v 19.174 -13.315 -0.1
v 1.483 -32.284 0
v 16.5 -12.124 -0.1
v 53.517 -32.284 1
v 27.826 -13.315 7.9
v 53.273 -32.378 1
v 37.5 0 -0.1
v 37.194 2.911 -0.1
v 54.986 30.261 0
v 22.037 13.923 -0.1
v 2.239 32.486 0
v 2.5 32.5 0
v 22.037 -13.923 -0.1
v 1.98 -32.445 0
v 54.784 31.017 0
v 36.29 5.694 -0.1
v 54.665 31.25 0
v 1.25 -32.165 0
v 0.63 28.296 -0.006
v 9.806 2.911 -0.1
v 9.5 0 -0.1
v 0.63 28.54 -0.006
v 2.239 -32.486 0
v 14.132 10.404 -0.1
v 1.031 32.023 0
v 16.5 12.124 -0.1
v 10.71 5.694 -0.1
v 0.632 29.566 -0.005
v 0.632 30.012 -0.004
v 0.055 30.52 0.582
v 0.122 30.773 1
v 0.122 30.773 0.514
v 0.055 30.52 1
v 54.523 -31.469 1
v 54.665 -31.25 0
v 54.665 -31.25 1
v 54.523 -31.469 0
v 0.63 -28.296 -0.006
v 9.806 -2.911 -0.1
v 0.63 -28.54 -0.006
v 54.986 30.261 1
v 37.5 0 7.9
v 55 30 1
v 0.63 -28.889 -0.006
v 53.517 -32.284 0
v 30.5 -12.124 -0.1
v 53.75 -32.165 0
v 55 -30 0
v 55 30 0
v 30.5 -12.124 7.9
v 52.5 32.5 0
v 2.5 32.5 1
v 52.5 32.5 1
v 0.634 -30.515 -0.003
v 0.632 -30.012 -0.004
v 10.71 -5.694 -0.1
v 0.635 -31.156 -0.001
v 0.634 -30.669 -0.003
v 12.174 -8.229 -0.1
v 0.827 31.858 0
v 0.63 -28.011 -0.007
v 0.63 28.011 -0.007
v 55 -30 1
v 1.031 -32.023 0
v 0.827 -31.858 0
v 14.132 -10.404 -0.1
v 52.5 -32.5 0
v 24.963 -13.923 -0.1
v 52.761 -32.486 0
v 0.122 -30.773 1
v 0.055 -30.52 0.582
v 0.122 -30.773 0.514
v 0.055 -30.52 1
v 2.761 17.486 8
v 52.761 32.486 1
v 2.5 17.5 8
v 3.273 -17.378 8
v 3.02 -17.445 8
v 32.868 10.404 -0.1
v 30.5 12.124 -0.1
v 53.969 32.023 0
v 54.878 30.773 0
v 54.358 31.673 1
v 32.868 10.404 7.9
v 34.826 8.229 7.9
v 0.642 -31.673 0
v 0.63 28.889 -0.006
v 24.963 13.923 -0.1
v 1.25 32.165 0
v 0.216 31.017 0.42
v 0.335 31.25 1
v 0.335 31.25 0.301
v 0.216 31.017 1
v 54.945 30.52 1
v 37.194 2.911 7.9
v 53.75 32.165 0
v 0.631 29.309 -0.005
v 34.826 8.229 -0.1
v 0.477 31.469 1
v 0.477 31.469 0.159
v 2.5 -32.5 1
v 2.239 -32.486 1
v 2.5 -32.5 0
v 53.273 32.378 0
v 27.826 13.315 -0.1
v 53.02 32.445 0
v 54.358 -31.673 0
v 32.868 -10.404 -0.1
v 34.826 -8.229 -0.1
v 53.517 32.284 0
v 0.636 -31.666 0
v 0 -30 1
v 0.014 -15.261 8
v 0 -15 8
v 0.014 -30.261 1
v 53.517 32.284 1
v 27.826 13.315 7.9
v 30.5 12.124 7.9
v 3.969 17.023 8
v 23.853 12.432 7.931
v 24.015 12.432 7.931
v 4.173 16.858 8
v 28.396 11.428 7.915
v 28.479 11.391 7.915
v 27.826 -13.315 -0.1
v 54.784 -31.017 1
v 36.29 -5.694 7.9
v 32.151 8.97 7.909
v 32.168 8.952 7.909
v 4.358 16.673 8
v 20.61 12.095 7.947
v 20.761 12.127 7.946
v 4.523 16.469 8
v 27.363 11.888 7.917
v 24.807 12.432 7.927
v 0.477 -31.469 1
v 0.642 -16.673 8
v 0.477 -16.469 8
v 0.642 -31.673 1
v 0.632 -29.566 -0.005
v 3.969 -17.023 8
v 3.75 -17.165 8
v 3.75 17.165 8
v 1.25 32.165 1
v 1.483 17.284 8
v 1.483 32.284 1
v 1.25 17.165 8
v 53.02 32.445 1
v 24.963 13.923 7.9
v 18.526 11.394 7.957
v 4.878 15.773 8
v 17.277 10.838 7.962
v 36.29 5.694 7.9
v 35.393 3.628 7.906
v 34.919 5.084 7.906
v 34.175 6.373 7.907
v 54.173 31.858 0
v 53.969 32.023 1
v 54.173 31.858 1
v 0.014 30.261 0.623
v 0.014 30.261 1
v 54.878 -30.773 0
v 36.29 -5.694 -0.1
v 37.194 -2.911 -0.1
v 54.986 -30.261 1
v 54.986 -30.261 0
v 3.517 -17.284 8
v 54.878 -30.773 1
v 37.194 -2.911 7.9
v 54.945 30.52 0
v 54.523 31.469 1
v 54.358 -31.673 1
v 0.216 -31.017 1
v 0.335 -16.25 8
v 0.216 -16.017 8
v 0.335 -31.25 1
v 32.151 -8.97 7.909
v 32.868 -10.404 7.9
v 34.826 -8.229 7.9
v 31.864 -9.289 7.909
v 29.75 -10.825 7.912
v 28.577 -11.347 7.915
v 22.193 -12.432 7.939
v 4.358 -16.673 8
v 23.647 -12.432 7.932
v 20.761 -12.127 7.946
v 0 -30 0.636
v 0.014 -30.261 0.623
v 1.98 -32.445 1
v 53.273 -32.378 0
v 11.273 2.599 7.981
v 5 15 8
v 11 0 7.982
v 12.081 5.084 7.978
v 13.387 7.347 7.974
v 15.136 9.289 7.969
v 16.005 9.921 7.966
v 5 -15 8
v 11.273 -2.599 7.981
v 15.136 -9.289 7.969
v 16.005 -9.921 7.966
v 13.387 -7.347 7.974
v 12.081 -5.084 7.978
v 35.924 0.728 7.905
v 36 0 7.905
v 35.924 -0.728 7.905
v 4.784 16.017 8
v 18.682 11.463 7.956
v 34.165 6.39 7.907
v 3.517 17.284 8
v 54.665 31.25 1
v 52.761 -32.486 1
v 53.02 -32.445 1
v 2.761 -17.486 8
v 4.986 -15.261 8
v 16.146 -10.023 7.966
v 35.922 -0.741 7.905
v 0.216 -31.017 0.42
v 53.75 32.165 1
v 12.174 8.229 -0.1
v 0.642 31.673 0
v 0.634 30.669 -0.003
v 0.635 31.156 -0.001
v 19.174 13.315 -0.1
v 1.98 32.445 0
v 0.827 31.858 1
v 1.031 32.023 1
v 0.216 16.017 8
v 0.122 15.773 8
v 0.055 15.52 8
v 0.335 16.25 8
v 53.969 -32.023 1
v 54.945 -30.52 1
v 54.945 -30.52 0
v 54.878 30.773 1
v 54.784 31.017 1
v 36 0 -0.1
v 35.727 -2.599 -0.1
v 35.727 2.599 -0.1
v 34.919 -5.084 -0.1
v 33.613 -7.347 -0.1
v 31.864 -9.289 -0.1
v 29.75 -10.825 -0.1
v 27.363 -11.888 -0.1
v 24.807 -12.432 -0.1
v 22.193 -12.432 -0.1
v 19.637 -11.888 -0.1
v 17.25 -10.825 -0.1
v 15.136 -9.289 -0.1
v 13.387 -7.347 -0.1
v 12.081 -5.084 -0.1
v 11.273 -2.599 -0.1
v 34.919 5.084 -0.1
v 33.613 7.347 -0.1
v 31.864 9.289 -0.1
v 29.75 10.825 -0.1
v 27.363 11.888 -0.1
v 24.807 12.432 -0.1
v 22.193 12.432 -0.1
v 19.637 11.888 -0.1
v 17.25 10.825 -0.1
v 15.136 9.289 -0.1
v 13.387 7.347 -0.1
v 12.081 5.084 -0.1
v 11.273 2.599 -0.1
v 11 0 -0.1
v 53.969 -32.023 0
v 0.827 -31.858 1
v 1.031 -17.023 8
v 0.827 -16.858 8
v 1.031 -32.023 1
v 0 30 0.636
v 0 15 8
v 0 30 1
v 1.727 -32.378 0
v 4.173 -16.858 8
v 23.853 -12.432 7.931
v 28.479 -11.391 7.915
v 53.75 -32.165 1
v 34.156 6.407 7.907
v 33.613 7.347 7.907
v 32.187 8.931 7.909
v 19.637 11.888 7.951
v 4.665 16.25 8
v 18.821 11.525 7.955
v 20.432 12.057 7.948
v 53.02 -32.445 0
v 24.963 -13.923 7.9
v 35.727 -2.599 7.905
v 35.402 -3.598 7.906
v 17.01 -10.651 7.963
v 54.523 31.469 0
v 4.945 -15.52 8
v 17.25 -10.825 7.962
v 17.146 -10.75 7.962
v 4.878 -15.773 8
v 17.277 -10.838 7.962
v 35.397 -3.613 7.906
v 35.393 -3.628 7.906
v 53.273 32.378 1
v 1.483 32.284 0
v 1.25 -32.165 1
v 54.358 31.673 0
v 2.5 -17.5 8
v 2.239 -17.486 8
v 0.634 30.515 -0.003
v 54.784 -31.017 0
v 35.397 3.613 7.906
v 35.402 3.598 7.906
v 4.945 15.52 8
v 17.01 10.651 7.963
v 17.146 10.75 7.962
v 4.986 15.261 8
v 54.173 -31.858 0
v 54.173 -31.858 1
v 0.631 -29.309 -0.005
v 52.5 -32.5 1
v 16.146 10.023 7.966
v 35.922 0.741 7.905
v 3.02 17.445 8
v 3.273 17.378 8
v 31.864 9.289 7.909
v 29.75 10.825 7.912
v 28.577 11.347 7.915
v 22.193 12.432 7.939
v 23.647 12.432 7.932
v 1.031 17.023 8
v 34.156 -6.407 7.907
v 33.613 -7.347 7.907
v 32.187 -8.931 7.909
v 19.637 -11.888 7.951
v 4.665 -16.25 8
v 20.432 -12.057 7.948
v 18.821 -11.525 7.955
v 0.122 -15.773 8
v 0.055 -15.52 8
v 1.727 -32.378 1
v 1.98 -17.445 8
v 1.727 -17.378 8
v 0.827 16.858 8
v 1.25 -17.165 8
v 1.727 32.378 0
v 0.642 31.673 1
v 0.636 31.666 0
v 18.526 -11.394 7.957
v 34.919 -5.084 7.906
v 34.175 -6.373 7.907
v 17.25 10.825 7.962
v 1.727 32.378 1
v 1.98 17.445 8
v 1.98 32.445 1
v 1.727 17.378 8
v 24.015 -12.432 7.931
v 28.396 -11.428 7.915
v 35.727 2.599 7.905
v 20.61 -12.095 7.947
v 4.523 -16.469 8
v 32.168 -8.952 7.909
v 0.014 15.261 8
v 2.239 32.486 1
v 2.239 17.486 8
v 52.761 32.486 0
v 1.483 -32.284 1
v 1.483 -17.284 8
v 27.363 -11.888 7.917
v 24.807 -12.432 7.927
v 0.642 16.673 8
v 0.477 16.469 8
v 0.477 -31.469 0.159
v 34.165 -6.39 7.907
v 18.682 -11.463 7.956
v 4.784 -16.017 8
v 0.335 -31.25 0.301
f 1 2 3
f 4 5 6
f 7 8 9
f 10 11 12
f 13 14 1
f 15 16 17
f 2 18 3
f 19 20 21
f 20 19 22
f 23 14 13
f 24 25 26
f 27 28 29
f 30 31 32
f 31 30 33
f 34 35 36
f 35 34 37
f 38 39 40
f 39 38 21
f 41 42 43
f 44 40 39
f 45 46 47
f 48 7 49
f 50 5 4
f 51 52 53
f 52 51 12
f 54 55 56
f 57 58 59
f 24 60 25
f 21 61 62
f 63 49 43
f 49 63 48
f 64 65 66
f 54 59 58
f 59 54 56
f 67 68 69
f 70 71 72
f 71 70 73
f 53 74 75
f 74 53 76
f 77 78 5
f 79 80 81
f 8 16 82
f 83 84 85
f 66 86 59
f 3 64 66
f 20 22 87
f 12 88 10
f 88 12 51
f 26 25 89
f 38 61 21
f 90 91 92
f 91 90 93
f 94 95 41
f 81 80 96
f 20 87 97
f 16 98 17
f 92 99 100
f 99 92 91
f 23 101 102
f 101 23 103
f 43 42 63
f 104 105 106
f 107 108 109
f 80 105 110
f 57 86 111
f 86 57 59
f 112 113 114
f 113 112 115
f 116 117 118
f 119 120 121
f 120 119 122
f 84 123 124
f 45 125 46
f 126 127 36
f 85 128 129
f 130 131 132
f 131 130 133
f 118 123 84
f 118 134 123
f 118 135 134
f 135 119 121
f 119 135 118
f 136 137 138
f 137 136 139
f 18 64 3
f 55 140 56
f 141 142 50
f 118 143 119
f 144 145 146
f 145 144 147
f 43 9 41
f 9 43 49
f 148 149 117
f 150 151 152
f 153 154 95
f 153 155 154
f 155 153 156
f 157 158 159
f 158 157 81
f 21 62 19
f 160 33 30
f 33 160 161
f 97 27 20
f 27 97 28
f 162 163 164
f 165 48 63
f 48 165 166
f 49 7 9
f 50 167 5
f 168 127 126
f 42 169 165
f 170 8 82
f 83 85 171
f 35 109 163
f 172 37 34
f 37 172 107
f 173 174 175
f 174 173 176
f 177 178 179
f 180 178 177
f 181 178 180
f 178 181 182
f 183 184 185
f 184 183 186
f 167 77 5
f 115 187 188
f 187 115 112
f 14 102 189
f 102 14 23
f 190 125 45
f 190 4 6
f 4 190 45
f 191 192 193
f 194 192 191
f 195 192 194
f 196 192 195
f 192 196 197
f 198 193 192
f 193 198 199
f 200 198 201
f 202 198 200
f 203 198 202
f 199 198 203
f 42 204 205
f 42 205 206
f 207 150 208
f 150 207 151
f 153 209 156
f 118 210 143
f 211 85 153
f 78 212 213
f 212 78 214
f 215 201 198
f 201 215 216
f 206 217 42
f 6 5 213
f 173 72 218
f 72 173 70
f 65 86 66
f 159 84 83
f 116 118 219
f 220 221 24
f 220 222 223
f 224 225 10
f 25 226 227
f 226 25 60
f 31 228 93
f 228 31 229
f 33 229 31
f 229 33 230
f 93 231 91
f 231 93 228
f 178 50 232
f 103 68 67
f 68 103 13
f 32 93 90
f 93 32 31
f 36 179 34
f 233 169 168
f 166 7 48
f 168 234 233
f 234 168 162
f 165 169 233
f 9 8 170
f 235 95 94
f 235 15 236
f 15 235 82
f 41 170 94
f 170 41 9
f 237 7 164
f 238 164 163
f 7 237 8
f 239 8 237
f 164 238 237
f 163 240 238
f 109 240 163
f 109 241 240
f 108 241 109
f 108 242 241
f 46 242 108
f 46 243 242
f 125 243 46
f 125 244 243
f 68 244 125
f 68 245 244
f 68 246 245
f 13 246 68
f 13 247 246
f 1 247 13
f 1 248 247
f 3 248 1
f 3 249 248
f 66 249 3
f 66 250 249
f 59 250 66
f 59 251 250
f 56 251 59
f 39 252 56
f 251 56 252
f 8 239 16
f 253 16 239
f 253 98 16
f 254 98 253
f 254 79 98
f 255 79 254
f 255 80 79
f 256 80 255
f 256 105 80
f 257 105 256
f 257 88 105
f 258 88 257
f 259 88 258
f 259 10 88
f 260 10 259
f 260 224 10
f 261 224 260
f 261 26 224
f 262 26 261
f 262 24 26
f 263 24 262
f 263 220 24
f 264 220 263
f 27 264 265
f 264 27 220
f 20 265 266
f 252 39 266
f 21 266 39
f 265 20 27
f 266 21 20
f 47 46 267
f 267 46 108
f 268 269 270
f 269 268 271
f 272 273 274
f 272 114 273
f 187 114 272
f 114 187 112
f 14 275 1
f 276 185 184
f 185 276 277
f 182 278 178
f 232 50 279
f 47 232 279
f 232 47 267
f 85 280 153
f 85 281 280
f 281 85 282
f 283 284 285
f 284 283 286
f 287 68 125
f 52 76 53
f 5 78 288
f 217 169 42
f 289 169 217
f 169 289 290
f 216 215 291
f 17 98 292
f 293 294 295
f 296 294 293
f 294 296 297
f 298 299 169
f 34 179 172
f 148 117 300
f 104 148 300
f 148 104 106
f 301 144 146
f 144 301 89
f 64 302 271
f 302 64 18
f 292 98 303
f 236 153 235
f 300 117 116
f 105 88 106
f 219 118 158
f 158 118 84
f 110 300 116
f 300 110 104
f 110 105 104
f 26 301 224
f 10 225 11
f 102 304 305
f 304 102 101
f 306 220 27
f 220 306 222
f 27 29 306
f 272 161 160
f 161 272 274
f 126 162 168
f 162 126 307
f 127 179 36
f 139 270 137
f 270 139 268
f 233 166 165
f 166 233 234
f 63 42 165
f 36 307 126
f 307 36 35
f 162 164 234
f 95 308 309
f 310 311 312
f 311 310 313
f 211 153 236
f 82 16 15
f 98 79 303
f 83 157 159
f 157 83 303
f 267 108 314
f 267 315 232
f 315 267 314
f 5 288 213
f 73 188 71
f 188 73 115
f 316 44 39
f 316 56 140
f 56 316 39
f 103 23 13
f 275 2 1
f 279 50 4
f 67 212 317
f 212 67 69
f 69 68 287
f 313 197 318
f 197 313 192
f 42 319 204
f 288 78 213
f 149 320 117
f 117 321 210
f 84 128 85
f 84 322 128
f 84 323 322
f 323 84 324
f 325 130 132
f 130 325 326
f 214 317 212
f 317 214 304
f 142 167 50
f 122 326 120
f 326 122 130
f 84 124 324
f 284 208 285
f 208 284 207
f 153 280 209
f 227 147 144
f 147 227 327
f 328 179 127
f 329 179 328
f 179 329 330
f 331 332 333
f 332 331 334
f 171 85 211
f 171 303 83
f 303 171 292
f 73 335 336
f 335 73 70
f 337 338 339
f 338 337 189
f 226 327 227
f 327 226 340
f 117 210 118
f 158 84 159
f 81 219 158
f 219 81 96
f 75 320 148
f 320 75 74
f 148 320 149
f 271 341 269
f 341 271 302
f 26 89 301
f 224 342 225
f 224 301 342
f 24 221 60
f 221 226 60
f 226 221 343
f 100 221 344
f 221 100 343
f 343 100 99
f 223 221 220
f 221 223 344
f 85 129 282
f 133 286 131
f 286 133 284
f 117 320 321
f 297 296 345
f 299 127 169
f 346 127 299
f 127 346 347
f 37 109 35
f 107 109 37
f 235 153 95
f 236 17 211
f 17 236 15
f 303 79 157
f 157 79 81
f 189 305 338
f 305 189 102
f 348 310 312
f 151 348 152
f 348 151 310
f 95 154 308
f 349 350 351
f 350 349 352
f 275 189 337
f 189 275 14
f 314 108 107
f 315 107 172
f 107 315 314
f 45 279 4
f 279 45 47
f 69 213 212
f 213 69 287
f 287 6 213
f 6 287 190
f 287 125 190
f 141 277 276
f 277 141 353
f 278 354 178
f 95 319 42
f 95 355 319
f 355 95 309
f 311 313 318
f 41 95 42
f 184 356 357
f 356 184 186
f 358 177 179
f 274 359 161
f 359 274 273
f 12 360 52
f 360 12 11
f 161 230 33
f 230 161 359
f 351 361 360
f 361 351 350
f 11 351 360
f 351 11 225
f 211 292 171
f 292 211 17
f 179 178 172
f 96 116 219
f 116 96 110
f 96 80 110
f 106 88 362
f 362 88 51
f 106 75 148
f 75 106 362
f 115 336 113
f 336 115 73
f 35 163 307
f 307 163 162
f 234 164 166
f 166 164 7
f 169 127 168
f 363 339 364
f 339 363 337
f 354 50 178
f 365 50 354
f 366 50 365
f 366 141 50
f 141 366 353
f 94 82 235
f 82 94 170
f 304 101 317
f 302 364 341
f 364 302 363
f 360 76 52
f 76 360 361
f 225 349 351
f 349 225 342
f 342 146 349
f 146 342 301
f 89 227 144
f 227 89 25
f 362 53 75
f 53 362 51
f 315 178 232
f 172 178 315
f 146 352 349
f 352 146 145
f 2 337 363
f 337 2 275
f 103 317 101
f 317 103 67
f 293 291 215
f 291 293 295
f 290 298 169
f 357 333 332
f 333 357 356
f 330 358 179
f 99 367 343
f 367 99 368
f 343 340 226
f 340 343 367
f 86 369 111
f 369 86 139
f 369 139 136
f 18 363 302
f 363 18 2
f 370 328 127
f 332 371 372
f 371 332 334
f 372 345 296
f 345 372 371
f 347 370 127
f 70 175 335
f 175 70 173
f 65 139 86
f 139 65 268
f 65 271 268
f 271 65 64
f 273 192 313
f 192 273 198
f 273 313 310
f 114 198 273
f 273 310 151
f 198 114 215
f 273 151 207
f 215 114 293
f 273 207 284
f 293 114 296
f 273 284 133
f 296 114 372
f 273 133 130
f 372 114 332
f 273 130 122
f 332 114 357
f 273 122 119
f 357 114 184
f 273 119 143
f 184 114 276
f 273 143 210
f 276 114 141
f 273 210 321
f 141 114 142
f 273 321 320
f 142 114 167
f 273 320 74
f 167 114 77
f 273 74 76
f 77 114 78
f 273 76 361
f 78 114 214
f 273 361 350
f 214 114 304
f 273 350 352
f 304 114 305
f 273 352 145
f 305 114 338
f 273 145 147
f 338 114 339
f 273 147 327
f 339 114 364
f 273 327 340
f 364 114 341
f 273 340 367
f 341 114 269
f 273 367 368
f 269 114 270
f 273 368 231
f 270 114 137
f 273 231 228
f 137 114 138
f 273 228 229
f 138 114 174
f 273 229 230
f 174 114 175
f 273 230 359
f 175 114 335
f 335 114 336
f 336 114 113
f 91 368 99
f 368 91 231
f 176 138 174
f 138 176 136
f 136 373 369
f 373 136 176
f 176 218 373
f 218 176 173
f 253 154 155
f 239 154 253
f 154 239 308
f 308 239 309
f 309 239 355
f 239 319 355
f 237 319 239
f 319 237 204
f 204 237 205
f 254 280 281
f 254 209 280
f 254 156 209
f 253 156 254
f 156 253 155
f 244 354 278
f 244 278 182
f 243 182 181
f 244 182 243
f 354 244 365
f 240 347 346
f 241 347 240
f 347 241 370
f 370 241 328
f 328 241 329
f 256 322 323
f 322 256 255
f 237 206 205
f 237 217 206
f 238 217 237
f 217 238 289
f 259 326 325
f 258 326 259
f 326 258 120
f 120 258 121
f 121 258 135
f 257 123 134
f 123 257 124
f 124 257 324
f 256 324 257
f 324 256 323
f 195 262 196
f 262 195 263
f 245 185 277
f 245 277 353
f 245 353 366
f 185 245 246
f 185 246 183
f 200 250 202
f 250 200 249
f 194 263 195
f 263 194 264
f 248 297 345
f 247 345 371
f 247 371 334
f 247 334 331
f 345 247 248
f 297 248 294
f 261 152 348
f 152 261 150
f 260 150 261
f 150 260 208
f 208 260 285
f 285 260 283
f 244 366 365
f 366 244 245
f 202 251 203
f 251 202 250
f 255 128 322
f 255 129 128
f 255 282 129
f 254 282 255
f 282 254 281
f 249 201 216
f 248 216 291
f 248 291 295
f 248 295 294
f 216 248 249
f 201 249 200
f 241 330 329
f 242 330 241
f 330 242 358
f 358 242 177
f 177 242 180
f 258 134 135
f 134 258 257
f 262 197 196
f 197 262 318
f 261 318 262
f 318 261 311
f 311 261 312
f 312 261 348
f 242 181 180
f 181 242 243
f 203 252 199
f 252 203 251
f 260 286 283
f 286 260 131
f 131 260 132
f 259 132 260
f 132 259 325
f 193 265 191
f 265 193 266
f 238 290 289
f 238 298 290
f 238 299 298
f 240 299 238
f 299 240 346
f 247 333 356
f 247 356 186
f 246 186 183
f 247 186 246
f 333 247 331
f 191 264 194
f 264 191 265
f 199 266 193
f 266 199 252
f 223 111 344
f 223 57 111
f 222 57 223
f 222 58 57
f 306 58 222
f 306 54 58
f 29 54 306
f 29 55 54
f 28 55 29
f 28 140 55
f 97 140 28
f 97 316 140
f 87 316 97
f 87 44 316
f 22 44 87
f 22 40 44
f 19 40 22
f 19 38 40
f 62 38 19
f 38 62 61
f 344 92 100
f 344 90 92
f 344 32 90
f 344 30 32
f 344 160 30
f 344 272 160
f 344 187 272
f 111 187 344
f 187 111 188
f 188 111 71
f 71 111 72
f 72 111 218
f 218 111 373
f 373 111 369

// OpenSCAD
// Copyright (c) 2016 Christian Ege <ch@ege.io>
// 
// This file is part of my OpenSCAD stuff
// 
// This is free software: you can redistribute it and/or modify
// it under the terms of the GNU Affero General Public License as
// published by the Free Software Foundation, either version 3 of the
// License, or (at your option) any later version.
// 
// This program is distributed in the hope that it will be useful,
// but WITHOUT ANY WARRANTY; without even the implied warranty of
// MERCHANTABILITY or FITNESS FOR A PARTICULAR PURPOSE.  See the
// GNU Affero General Public License for more details.
// 
// You should have received a copy of the GNU Affero General Public License
// along with this program. If not, see <http://www.gnu.org/licenses/>.


stand_r=28/2;
hole_r=25/2;
pin_r=23/2;
edge_r=5/2;
pin_off_x=12+pin_r;

dim_z=8;
dim_x=50+edge_r;
dim_y=60;

cylinders=[ 
                       [dim_x,dim_y/2,1],
                       [edge_r,dim_y/2,1],
                       [dim_x,-dim_y/2,1],
                       [edge_r,-dim_y/2,1],
                       [edge_r,-dim_y/4,dim_z],
                       [edge_r,dim_y/4,dim_z]
];


difference() {
	hull() {
		translate([pin_off_x,0,-0.1])cylinder(r=stand_r,h=dim_z);
		for(i=cylinders) {
			translate([i[0],i[1],0]) {
				cylinder(r=edge_r,h=i[2],$fn=60);
			}
		}
	}
	translate([pin_off_x,0,-0.2]){
		cylinder(r=hole_r,h=dim_z+2);
	}

	translate([0,0,0]){
		rotate([0,45,0])#cube([0.9,100,0.9],center=true);
	}


}
